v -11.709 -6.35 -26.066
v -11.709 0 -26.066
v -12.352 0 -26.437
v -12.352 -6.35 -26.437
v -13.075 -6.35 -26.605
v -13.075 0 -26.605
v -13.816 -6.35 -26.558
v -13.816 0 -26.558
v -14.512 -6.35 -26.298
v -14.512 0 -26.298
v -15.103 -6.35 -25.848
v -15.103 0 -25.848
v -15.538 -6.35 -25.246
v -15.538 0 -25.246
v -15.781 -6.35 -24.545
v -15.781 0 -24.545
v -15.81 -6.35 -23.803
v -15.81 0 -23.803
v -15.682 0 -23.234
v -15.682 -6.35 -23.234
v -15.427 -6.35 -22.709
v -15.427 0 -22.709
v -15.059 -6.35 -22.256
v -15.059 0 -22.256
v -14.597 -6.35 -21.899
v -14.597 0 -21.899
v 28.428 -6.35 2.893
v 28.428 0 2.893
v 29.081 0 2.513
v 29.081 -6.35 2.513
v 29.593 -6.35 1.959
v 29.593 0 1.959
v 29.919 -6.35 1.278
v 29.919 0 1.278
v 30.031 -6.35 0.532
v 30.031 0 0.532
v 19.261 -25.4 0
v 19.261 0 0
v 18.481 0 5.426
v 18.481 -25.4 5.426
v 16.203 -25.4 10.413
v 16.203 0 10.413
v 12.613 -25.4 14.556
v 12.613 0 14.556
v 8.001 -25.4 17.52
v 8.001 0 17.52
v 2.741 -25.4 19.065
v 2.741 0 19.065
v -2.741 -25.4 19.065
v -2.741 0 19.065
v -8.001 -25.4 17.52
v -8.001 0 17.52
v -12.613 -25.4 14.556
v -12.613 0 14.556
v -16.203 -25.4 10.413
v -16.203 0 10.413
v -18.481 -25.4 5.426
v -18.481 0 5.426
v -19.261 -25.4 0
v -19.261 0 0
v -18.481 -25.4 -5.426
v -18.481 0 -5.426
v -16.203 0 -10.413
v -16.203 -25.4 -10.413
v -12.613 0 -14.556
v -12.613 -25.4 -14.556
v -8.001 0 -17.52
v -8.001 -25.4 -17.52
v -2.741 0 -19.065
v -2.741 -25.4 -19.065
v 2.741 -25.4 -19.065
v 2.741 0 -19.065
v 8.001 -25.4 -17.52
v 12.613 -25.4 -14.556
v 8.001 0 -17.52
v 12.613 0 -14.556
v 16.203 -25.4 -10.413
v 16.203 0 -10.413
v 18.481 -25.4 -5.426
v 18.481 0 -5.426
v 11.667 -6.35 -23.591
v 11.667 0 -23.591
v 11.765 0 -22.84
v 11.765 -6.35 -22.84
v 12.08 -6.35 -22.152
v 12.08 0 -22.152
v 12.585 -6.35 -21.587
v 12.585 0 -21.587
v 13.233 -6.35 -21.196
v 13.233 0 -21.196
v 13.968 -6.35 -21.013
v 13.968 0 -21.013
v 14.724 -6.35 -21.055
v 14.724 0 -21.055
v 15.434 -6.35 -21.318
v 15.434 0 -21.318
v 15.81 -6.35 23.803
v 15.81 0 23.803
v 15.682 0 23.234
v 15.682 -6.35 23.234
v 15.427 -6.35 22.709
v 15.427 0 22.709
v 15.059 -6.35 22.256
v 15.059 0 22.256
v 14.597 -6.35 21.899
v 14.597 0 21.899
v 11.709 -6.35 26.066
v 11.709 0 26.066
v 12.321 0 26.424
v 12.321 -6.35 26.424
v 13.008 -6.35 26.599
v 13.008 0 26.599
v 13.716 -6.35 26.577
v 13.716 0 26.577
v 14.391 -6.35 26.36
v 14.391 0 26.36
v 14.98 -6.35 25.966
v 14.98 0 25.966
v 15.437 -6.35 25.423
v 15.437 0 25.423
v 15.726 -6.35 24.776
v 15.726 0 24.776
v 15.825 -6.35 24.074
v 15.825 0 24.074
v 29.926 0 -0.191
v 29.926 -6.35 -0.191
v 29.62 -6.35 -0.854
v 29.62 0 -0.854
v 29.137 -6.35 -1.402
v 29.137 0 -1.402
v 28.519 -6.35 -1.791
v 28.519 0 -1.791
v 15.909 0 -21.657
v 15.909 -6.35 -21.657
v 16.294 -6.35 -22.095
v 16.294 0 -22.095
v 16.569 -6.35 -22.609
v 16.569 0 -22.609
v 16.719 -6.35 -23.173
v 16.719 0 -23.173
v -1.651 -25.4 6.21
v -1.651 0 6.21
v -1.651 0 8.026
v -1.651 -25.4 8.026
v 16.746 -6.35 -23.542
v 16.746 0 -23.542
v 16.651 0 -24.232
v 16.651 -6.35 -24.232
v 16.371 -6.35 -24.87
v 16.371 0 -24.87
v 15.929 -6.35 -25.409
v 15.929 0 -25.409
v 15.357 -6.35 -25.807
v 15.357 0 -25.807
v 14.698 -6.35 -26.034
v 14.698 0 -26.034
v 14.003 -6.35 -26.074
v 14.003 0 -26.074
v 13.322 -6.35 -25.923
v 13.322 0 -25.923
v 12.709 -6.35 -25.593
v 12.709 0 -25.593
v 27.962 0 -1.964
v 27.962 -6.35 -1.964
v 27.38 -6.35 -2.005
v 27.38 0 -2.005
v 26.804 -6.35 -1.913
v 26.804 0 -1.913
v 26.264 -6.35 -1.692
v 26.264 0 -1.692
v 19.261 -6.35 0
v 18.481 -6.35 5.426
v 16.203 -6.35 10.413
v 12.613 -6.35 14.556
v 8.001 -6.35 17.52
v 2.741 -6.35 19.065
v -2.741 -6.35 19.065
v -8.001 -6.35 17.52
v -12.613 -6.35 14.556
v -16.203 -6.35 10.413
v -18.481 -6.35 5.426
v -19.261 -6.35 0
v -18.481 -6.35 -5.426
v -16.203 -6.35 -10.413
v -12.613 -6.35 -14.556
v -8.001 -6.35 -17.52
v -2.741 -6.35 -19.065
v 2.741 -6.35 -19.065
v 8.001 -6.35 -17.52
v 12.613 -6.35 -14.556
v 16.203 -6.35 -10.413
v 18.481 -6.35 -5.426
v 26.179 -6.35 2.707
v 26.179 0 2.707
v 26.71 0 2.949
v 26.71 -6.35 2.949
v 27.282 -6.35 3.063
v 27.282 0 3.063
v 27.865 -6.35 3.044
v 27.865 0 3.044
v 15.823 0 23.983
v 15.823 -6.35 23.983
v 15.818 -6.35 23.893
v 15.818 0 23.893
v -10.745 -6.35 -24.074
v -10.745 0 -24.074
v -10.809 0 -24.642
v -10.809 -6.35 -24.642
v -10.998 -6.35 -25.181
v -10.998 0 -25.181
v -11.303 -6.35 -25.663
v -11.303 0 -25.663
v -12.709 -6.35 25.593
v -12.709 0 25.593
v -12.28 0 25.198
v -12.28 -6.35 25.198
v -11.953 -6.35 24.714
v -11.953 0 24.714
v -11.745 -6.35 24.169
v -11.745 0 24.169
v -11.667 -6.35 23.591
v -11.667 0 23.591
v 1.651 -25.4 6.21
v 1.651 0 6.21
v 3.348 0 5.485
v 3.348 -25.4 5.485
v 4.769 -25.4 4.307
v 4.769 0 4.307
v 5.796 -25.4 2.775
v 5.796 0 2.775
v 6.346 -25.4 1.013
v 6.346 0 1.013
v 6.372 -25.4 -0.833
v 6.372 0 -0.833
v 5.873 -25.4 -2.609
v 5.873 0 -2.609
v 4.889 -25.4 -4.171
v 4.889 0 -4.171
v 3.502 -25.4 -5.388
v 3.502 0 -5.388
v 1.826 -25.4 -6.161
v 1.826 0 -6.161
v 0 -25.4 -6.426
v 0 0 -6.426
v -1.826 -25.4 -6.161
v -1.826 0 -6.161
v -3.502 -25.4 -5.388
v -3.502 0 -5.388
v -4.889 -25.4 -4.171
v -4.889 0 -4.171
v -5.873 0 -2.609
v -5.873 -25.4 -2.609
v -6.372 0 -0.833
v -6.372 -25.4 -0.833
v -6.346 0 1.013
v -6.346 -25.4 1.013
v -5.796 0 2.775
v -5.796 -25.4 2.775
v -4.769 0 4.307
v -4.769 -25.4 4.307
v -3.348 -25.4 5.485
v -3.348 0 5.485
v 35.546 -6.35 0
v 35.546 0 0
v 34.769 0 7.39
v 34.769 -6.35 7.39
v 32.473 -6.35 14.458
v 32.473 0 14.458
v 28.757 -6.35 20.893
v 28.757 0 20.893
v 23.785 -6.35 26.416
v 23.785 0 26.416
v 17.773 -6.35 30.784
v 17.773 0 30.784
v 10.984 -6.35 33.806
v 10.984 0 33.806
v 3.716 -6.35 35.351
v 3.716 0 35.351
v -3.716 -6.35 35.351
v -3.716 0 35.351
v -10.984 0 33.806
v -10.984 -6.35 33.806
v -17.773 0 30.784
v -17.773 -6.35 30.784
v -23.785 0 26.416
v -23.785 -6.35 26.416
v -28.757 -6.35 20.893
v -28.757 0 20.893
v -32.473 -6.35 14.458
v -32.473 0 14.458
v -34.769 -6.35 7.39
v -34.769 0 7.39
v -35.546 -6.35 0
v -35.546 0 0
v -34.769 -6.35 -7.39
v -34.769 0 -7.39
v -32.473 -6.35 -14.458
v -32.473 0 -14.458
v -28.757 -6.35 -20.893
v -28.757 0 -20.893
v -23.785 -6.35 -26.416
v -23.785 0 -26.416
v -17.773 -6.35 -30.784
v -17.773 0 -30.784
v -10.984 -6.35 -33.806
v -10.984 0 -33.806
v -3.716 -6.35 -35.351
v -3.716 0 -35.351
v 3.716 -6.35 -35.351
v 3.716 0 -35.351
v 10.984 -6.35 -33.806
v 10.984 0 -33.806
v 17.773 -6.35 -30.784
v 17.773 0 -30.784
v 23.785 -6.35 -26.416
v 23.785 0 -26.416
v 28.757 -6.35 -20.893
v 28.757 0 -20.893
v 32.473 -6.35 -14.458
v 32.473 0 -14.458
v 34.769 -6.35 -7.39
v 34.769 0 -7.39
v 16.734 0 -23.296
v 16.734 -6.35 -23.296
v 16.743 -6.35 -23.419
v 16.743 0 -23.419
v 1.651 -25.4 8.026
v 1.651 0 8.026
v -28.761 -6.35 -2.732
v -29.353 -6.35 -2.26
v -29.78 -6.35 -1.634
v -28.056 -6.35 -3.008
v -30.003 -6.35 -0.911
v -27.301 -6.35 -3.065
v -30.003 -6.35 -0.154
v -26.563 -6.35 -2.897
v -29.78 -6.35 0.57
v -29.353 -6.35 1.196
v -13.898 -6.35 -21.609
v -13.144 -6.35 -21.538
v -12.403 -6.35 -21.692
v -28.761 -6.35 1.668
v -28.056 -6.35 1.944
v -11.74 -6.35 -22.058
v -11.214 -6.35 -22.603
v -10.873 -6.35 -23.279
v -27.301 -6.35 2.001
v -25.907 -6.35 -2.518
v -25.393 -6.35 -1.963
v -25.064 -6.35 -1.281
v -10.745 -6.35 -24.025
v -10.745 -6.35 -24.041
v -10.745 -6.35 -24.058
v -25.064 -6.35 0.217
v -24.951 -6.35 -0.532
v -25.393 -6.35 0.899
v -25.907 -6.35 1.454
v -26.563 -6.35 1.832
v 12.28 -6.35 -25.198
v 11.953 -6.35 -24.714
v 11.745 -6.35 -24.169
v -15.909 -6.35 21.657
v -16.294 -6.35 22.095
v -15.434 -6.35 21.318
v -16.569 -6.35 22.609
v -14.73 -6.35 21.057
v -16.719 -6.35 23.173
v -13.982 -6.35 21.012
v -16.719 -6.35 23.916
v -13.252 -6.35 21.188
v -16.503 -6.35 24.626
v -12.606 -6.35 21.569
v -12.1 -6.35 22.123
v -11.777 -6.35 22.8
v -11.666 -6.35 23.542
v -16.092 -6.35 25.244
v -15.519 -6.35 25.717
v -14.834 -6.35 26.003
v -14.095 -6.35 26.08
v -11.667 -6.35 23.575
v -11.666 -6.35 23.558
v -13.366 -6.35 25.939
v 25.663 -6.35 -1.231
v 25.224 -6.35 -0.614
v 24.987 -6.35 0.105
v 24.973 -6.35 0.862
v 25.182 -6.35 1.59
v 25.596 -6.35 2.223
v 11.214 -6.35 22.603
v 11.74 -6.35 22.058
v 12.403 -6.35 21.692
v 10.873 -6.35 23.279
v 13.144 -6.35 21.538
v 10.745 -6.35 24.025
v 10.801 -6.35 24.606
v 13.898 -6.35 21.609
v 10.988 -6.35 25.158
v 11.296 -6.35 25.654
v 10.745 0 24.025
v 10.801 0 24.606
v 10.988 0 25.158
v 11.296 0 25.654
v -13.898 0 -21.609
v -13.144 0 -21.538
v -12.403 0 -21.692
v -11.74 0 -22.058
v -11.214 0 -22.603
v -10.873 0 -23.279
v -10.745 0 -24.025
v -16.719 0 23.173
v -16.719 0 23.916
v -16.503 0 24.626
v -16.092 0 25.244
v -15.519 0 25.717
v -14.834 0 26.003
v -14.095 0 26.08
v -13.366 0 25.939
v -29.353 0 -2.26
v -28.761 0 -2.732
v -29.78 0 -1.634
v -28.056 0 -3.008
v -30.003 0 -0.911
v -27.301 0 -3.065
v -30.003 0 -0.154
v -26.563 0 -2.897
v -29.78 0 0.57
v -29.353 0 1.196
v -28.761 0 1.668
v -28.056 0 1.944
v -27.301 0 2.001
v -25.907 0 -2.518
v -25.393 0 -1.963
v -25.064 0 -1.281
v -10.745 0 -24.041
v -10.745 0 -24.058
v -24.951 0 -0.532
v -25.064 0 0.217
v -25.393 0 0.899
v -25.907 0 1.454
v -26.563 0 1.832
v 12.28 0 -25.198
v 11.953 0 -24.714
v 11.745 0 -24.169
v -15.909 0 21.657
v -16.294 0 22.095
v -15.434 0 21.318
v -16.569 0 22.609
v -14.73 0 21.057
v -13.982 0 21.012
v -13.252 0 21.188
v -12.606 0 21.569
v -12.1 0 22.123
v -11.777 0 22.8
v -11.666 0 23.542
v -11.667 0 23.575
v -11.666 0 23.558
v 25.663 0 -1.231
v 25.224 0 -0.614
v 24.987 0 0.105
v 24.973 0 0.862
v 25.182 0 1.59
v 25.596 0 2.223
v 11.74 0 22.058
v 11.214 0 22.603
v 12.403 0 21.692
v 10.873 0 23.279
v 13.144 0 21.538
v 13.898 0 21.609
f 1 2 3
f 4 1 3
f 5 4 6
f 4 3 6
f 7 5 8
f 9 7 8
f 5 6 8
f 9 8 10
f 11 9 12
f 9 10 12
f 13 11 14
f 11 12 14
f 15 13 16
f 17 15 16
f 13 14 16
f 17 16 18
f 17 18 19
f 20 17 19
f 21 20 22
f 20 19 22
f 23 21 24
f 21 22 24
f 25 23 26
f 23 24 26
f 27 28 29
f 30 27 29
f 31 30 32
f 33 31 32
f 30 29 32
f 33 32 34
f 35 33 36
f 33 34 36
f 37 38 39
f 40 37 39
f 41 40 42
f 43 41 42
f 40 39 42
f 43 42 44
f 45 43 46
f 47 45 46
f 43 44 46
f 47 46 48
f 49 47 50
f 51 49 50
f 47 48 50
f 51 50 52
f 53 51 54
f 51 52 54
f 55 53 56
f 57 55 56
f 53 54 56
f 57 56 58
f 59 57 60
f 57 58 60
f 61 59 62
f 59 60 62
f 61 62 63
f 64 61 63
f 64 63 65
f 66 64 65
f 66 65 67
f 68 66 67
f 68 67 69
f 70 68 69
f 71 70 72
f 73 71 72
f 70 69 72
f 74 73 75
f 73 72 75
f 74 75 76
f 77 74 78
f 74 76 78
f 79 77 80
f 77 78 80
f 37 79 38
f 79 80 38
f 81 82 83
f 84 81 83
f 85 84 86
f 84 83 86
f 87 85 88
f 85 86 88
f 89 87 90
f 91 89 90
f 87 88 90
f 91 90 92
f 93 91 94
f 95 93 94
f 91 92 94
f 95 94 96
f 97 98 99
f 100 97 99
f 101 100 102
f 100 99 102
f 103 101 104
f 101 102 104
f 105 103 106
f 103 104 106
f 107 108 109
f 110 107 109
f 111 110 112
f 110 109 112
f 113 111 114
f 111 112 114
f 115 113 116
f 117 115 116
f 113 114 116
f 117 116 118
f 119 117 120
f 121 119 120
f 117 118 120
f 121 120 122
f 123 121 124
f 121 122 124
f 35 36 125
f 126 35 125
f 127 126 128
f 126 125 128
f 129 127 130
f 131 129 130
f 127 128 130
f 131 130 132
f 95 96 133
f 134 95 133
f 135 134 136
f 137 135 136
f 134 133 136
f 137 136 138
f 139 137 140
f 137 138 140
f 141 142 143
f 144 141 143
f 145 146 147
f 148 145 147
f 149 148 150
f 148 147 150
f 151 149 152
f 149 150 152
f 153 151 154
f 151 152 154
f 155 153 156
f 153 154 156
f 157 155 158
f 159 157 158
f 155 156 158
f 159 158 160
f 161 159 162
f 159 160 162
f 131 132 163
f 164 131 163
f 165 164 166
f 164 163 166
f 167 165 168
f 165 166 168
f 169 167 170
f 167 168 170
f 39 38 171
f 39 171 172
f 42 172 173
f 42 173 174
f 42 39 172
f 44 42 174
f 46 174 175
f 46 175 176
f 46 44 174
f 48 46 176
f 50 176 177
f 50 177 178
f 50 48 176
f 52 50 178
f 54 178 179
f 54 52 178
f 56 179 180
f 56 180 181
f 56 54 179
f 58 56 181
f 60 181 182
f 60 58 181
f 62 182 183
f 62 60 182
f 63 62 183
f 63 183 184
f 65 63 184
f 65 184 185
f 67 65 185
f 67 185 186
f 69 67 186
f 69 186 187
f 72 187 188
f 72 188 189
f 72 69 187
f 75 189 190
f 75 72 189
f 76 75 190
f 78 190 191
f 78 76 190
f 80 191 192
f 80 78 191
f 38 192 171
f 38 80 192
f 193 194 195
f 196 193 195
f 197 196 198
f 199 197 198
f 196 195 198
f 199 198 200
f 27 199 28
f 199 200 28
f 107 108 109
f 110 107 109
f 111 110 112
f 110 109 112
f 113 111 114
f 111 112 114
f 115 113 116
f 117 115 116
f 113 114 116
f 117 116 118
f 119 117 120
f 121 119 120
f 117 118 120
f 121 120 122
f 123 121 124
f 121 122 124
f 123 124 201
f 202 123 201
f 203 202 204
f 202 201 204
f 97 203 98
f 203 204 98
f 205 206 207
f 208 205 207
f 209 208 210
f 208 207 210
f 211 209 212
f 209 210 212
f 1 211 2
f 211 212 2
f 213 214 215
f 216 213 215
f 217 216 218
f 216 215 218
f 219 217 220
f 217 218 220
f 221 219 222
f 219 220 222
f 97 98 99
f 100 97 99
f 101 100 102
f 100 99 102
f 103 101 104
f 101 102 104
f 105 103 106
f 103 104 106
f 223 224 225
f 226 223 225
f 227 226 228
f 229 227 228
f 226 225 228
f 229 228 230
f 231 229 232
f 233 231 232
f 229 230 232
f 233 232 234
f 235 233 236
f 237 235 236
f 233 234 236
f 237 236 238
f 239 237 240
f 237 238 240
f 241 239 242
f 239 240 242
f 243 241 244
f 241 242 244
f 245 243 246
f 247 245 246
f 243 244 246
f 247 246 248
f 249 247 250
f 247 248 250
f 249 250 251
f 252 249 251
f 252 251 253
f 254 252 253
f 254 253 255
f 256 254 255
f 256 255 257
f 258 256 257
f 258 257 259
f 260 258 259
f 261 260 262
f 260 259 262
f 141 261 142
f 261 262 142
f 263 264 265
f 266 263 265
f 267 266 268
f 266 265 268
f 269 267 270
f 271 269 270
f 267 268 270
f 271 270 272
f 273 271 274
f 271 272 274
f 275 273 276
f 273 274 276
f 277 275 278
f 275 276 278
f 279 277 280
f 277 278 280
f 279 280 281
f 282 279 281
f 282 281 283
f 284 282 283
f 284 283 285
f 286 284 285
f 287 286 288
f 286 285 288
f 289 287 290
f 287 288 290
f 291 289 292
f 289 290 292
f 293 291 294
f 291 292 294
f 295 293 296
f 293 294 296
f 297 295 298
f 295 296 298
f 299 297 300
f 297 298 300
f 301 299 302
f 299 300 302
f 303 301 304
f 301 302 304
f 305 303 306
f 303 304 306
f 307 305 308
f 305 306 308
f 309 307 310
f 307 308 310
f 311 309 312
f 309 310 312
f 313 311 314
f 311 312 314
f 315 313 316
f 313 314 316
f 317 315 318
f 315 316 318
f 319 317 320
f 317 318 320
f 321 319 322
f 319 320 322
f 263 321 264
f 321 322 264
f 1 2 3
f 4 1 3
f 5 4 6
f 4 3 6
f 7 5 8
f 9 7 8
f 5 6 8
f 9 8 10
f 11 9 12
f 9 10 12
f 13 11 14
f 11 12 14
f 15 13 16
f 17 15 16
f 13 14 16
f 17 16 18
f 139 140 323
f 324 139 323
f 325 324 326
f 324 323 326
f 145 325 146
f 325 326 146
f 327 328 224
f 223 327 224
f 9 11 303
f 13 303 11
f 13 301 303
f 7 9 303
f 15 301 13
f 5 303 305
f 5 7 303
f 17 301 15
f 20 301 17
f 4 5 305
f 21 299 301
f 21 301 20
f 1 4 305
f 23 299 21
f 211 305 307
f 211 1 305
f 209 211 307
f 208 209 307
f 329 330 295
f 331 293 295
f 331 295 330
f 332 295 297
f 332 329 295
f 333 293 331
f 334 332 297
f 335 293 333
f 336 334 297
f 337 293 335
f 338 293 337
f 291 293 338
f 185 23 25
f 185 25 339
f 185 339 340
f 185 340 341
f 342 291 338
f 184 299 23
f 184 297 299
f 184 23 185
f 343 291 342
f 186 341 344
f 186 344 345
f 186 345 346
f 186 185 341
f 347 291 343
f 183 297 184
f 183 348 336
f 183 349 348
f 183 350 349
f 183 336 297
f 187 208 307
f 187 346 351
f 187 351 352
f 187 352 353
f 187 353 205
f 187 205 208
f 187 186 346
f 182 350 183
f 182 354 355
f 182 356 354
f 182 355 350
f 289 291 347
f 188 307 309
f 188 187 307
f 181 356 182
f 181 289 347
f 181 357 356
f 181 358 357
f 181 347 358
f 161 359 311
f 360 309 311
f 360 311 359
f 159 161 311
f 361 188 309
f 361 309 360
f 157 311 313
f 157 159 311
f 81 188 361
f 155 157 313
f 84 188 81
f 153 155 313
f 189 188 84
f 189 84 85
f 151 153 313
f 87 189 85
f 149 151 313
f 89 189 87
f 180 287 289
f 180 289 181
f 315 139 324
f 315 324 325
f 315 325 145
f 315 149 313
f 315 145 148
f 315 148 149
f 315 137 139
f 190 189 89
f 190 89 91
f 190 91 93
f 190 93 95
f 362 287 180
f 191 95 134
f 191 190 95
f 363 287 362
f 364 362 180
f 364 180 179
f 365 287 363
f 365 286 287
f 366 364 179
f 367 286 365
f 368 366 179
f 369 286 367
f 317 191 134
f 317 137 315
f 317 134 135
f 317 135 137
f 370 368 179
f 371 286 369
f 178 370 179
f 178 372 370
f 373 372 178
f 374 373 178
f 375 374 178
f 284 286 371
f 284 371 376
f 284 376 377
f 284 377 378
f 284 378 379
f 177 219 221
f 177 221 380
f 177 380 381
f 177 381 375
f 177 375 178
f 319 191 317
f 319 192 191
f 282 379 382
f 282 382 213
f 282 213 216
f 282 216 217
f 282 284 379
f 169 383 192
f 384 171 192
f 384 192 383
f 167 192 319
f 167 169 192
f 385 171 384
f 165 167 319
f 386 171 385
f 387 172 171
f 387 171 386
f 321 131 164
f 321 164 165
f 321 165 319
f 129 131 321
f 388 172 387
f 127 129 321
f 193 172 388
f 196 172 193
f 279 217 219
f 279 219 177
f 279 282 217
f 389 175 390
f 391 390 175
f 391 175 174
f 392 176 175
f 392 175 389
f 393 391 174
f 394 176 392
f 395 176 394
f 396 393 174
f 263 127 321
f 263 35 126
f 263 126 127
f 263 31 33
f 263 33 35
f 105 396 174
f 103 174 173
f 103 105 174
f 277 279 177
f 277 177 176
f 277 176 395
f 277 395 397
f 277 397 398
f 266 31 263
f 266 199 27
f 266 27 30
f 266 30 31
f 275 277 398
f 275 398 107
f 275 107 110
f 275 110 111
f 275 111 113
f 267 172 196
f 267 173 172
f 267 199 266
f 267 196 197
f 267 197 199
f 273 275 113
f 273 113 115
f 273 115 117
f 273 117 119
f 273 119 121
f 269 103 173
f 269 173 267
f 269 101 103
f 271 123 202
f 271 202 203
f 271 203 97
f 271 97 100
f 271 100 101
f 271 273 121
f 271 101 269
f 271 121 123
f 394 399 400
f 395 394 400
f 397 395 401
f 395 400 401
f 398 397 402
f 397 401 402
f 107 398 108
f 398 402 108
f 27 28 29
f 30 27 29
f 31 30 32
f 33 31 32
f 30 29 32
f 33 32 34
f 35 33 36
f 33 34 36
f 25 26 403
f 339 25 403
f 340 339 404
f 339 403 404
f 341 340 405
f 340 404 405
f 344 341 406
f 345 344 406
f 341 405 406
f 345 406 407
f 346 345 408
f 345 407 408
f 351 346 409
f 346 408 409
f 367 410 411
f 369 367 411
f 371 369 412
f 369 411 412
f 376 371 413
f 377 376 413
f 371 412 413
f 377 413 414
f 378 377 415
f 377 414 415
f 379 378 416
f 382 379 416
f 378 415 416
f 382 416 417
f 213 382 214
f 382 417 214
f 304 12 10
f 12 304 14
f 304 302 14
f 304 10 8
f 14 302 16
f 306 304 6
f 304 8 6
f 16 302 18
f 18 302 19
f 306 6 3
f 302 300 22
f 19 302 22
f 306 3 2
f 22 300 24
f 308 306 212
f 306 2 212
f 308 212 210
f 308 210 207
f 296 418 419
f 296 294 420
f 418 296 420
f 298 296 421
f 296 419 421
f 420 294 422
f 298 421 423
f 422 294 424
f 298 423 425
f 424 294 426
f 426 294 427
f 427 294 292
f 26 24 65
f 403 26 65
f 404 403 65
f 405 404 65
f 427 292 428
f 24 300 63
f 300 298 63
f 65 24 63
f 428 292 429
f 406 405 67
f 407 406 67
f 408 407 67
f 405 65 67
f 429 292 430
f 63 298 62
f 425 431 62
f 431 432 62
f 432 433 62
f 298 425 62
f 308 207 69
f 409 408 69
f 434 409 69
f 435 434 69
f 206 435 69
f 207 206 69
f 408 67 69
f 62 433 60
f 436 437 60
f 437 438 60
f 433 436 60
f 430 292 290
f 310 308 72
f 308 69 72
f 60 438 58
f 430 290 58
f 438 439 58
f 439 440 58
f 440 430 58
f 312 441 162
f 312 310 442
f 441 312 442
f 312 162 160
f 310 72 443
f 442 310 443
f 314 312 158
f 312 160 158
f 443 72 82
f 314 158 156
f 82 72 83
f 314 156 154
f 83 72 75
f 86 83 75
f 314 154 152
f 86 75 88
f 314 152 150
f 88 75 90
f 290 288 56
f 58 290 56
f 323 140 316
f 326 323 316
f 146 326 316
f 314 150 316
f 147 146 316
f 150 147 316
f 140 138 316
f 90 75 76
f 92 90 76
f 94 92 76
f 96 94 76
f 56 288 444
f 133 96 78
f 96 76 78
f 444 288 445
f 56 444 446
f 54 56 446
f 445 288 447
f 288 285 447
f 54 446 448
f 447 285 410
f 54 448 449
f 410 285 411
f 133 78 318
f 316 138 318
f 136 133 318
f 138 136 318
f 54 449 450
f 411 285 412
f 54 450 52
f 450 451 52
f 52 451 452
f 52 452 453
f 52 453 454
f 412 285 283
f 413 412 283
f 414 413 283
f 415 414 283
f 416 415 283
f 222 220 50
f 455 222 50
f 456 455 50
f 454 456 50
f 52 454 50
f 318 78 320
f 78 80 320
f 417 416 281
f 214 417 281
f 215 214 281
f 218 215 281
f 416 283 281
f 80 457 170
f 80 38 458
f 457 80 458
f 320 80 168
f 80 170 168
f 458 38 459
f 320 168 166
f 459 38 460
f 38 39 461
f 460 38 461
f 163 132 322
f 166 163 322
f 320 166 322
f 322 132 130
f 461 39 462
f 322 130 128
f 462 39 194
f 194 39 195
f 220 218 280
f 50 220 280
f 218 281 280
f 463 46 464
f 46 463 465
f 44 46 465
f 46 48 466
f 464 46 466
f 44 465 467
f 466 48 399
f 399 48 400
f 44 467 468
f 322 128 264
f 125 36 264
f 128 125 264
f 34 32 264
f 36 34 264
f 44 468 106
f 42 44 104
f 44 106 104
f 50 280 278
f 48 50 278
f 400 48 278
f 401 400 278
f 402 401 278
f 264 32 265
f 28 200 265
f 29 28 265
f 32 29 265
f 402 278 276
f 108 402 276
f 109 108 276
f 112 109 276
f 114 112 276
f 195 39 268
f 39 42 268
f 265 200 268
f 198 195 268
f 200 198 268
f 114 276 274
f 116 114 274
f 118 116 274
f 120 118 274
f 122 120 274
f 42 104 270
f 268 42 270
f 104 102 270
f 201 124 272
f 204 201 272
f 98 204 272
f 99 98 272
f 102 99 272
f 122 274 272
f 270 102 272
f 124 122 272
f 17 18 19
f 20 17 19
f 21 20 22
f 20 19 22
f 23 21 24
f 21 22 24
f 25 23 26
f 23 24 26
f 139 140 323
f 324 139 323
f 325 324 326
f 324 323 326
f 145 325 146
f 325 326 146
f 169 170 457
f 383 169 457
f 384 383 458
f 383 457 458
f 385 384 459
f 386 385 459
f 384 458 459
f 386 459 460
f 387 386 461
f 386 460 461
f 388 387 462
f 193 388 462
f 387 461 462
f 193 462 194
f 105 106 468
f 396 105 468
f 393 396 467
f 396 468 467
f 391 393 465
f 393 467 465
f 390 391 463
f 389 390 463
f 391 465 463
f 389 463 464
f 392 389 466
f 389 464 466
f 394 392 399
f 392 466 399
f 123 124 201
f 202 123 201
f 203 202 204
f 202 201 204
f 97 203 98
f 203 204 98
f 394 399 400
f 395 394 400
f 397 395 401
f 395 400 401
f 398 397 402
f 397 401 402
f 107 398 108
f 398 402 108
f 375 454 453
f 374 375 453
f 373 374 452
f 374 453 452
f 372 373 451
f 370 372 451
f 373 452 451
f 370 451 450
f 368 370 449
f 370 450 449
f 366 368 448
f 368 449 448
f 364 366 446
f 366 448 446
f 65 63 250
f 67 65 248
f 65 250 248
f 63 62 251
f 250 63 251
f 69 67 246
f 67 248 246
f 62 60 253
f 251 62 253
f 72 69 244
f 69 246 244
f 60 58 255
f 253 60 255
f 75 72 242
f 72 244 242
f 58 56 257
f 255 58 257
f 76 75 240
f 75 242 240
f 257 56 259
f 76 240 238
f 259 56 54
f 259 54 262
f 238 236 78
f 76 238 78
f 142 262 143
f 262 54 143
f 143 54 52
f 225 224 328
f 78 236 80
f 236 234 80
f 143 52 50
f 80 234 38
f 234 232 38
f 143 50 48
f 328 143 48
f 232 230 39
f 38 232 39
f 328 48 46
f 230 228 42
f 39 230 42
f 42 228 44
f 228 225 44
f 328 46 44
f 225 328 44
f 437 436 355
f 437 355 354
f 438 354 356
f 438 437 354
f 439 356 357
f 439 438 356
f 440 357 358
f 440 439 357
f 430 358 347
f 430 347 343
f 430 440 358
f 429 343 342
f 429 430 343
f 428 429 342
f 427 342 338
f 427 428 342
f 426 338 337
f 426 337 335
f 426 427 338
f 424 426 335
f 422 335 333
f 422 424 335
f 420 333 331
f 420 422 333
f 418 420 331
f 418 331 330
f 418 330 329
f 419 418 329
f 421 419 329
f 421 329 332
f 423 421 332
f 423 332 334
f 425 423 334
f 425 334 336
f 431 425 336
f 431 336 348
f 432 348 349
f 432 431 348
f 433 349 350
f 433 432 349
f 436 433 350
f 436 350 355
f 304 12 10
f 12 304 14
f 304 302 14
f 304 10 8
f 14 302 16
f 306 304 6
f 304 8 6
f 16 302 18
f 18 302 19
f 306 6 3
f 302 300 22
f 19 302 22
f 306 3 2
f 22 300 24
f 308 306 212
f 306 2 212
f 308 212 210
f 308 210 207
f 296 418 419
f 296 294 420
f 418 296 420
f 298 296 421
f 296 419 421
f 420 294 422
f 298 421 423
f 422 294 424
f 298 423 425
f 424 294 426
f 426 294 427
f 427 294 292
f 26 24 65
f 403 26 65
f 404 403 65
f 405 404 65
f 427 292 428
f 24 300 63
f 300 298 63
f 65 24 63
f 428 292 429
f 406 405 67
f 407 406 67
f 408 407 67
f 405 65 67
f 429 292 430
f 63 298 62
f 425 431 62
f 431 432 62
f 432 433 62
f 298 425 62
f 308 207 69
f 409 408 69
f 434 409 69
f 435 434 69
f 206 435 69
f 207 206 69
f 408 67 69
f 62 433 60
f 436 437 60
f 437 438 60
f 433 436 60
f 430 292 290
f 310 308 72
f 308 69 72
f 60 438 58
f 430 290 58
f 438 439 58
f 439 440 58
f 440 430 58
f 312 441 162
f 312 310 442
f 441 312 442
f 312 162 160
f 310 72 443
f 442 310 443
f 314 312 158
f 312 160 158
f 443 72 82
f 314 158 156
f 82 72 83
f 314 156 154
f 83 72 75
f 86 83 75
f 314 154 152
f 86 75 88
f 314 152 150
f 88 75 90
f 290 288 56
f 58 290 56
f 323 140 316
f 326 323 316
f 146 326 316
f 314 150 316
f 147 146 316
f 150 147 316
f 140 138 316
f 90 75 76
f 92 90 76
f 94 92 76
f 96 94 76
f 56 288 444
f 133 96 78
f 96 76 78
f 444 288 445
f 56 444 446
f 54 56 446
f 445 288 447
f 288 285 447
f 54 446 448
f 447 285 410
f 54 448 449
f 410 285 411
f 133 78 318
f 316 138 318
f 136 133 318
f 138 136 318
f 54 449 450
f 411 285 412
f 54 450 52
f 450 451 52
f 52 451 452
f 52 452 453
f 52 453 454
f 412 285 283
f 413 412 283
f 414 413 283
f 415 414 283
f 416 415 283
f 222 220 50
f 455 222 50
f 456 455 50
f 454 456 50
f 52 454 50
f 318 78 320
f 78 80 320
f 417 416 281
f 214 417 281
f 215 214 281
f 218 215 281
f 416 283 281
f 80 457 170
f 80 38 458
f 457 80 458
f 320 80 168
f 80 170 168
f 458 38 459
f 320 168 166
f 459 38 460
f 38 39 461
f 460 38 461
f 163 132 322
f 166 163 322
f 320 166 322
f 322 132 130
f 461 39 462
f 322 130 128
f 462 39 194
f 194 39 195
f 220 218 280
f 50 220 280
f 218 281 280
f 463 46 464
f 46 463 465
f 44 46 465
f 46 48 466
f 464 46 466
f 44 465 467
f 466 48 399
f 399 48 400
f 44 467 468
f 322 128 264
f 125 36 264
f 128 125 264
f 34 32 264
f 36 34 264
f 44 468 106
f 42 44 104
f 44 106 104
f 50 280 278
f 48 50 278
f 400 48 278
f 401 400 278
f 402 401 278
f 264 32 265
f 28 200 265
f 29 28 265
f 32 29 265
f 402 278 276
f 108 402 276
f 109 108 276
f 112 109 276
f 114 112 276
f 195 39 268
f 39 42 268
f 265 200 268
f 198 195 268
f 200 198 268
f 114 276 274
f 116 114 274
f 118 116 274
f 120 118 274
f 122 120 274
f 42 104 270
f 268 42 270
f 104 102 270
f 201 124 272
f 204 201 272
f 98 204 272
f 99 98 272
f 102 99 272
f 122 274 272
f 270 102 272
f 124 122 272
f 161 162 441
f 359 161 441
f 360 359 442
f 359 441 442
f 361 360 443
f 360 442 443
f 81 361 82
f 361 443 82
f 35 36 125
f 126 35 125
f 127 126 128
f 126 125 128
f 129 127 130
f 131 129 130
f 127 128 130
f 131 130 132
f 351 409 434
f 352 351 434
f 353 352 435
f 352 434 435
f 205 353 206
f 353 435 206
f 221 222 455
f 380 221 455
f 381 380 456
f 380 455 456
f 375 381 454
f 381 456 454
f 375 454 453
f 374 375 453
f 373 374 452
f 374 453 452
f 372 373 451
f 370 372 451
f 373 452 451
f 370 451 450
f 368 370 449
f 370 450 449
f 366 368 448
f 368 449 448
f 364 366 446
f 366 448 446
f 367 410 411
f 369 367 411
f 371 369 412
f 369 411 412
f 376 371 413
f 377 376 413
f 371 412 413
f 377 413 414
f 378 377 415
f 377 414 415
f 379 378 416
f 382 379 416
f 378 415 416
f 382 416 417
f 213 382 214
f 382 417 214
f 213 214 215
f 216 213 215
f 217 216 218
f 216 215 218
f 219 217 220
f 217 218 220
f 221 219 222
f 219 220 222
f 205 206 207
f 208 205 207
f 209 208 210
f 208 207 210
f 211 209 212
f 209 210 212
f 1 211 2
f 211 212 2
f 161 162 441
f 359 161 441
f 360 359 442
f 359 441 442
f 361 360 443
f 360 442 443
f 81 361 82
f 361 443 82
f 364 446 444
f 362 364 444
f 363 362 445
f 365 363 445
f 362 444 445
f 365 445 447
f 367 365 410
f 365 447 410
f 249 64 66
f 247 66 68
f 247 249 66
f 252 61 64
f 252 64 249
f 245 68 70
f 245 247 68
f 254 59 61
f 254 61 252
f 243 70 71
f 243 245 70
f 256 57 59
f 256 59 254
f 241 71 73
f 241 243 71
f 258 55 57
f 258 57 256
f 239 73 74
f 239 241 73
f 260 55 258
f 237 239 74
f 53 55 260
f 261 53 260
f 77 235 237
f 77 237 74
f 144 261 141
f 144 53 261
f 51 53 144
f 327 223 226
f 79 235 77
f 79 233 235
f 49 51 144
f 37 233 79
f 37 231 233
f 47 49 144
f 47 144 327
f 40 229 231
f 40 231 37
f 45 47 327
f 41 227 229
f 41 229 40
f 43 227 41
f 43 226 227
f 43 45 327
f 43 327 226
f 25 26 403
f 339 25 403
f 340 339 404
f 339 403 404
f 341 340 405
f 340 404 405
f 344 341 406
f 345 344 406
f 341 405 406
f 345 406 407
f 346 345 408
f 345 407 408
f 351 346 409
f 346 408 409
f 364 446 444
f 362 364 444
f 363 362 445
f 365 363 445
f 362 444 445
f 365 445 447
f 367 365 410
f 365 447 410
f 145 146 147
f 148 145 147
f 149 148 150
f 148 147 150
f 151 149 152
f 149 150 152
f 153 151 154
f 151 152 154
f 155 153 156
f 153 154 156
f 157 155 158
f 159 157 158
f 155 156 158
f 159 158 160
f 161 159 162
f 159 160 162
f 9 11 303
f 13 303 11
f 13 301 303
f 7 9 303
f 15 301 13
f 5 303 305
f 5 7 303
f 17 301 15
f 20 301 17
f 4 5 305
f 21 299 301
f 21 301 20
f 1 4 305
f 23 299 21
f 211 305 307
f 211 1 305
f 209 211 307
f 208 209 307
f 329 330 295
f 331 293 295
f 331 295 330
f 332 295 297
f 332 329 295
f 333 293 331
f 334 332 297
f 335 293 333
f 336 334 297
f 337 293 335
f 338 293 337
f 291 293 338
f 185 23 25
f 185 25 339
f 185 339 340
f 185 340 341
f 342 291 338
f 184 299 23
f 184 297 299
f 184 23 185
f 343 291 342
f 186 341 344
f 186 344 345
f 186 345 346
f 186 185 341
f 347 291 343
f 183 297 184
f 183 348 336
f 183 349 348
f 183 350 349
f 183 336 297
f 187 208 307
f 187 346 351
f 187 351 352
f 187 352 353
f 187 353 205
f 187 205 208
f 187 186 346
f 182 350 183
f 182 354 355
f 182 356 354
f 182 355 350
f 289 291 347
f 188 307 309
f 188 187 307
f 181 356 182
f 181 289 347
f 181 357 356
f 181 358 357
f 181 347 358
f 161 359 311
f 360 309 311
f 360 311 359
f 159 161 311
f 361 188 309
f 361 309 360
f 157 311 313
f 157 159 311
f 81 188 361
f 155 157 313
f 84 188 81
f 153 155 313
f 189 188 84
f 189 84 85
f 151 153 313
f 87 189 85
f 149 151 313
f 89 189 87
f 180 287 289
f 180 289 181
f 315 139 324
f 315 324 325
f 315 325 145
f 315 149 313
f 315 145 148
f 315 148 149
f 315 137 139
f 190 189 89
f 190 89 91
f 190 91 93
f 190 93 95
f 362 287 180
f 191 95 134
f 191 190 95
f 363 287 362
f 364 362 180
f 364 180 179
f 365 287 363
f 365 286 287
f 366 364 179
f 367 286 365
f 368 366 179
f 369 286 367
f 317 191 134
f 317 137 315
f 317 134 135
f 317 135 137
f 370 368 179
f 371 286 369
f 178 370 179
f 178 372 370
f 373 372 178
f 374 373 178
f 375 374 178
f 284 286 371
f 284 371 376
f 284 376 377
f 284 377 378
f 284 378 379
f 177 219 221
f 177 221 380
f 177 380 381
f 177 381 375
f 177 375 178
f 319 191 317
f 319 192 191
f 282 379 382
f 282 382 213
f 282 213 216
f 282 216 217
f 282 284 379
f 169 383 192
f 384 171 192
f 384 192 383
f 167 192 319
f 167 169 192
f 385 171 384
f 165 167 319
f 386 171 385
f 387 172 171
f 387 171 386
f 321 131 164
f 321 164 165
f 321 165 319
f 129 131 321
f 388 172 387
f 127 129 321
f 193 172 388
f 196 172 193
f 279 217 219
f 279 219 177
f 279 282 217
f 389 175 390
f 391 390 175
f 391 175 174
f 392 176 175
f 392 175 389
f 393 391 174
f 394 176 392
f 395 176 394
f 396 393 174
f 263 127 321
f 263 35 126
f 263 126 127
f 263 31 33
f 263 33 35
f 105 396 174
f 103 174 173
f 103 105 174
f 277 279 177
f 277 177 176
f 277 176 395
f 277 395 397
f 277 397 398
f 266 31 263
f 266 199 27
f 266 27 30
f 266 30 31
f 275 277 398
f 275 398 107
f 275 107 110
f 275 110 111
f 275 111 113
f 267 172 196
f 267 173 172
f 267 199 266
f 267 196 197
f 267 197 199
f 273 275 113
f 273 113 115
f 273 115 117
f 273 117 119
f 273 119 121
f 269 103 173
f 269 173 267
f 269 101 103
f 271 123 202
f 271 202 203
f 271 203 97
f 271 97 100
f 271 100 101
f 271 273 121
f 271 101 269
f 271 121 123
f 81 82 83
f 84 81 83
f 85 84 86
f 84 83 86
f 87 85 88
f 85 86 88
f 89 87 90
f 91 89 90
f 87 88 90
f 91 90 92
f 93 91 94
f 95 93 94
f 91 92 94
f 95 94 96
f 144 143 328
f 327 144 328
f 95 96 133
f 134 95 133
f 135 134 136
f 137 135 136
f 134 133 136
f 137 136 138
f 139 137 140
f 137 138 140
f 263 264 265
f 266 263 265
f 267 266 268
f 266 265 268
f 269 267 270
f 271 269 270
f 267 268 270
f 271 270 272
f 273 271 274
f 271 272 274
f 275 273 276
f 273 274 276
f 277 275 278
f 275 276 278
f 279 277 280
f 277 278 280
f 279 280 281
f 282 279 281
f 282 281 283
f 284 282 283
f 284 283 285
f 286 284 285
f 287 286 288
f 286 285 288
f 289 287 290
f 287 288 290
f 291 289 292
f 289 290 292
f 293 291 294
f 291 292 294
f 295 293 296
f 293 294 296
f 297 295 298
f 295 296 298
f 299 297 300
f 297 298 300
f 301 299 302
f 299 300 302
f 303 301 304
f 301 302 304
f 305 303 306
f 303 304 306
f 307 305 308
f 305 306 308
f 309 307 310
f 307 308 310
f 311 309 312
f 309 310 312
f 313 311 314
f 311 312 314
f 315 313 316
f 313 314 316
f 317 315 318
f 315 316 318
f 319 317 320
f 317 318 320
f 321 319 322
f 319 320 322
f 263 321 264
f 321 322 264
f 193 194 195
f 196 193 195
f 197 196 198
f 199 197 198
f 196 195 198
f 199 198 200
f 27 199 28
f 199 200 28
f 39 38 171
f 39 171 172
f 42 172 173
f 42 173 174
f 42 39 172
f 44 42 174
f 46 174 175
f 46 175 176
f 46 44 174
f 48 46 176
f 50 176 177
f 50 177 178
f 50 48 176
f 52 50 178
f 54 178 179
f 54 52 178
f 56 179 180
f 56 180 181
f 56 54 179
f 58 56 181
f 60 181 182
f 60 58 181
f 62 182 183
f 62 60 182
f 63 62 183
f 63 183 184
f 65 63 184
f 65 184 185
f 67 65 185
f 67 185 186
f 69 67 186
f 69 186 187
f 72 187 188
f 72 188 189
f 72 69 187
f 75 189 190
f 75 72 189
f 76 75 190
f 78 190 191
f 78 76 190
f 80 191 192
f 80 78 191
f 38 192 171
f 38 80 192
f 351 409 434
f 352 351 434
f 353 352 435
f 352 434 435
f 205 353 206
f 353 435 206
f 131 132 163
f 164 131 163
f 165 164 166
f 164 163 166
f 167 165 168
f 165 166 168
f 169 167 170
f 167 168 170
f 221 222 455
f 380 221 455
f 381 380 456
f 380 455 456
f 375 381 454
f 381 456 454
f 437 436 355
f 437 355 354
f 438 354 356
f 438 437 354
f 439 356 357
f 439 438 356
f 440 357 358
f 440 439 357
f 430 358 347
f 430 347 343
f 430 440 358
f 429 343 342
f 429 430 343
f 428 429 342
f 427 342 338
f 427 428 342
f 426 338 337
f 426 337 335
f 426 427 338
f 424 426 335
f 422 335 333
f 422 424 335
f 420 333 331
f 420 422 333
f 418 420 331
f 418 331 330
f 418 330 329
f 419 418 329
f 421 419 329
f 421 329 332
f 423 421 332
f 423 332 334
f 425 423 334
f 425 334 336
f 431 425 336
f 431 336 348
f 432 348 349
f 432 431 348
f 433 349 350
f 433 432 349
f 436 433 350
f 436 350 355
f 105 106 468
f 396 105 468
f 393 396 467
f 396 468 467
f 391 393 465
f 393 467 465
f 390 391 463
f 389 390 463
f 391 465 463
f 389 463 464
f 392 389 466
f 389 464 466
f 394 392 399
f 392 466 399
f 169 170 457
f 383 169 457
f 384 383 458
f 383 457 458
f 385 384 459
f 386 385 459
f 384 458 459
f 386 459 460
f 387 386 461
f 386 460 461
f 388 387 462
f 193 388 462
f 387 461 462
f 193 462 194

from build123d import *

# Parameters (mm, degrees)
F0_R     = 19.2609735147
F0_R_2   = 12.2005703348
F1_DEPTH = 25.4
F0_R_3   = 35.5458123626
F0_R_4   = 2.54
F2_DEPTH = 6.35
F3_DEPTH = 6.35


# Not quite as in the source:
# - a feature names something its author has since deleted; it is built from what else it names


with BuildPart() as f1:
    # F0 (on Front) → F1 (new body)
    with BuildSketch(Plane.XZ):
        Circle(F0_R)
        Circle(F0_R_2, mode=Mode.SUBTRACT)
        Circle(F0_R_2)
        with BuildLine():
            ThreePointArc((1.651, 6.2104947822), (0, -6.4262), (-1.651, 6.2104947822))
            Line((-1.651, 6.2104947822), (-1.651, 8.0264))
            Line((-1.651, 8.0264), (1.651, 8.0264))
            Line((1.651, 8.0264), (1.651, 6.2104947822))
        make_face(mode=Mode.SUBTRACT)
    extrude(amount=F1_DEPTH)


with BuildPart() as f2:
    # F0 (on Front) → F2 (new body)
    with BuildSketch(Plane.XZ):
        Circle(F0_R_3)
        with BuildLine():
            ThreePointArc((-15.8102357857, -23.8026693755), (-15.4266913627, -22.7088700736), (-14.5971077055, -21.899367638))
            ThreePointArc((-14.5971077055, -21.899367638), (-12.0575833253, -21.8502156048), (-10.7452542258, -24.024932215))
            ThreePointArc((-10.7452542258, -24.024932215), (-10.7448975137, -24.0495070811), (-10.744778606, -24.0740842482))
            ThreePointArc((-10.744778606, -24.0740842482), (-10.9984346498, -25.1805341179), (-11.7087402706, -26.0659936752))
            ThreePointArc((-11.7087402706, -26.0659936752), (-14.5119738867, -26.2979528916), (-15.8102357857, -23.8026693755))
        make_face(mode=Mode.SUBTRACT)
        with Locations((-27.4911578348, -0.5320863677)):
            Circle(F0_R_4, mode=Mode.SUBTRACT)
        with BuildLine():
            ThreePointArc((12.7085984642, -25.593400518), (11.9531126936, -24.7143416532), (11.6668548486, -23.5911499138))
            ThreePointArc((11.6668548486, -23.5911499138), (12.8940501293, -21.3672812704), (15.4335745095, -21.3181292371))
            ThreePointArc((15.4335745095, -21.3181292371), (16.2938606715, -22.0949245492), (16.7194425623, -23.1730633582))
            ThreePointArc((16.7194425623, -23.1730633582), (16.7396361115, -23.3570395976), (16.7463792288, -23.5419978805))
            ThreePointArc((16.7463792288, -23.5419978805), (15.3568653995, -25.8065025882), (12.7085984642, -25.593400518))
        make_face(mode=Mode.SUBTRACT)
        with BuildLine():
            ThreePointArc((-12.7085984642, 25.593400518), (-11.9531126936, 24.7143416532), (-11.6668548486, 23.5911499138))
            ThreePointArc((-11.6668548486, 23.5911499138), (-11.6664981365, 23.5665750477), (-11.6663792288, 23.5419978805))
            ThreePointArc((-11.6663792288, 23.5419978805), (-12.9151542316, 21.3546849156), (-15.4335745095, 21.3181292371))
            ThreePointArc((-15.4335745095, 21.3181292371), (-16.2938606715, 22.0949245492), (-16.7194425623, 23.1730633582))
            ThreePointArc((-16.7194425623, 23.1730633582), (-15.5187083283, 25.7167144907), (-12.7085984642, 25.593400518))
        make_face(mode=Mode.SUBTRACT)
        Circle(F0_R, mode=Mode.SUBTRACT)
        with BuildLine():
            ThreePointArc((28.5188342499, -1.7907311425), (27.3798040563, -2.0054715796), (26.2639625541, -1.6917822757))
            ThreePointArc((26.2639625541, -1.6917822757), (24.9516334546, 0.4829343345), (26.1788287353, 2.7068029779))
            ThreePointArc((26.1788287353, 2.7068029779), (27.2816962901, 3.0634349927), (28.4281828329, 2.892930317))
            ThreePointArc((28.4281828329, 2.892930317), (29.592543508, 1.9588933807), (30.0311578348, 0.5320863677))
            ThreePointArc((30.0311578348, 0.5320863677), (29.6197604391, -0.8537891508), (28.5188342499, -1.7907311425))
        make_face(mode=Mode.SUBTRACT)
        with BuildLine():
            ThreePointArc((15.8102357857, 23.8026693755), (15.4266913627, 22.7088700736), (14.5971077055, 21.899367638))
            ThreePointArc((14.5971077055, 21.899367638), (12.0575833253, 21.8502156048), (10.7452542258, 24.024932215))
            ThreePointArc((10.7452542258, 24.024932215), (10.9878356185, 25.1583595419), (11.7087402706, 26.0659936752))
            ThreePointArc((11.7087402706, 26.0659936752), (14.3912284756, 26.3604282044), (15.824778606, 24.0740842482))
            ThreePointArc((15.824778606, 24.0740842482), (15.8211402951, 23.9381821449), (15.8102357857, 23.8026693755))
        make_face(mode=Mode.SUBTRACT)
    extrude(amount=F2_DEPTH)


with BuildPart() as f3:
    # F0 (on Front) → F3 (new body)
    with BuildSketch(Plane.XZ):
        Circle(F0_R_3)
        with BuildLine():
            ThreePointArc((-15.8102357857, -23.8026693755), (-15.4266913627, -22.7088700736), (-14.5971077055, -21.899367638))
            ThreePointArc((-14.5971077055, -21.899367638), (-12.0575833253, -21.8502156048), (-10.7452542258, -24.024932215))
            ThreePointArc((-10.7452542258, -24.024932215), (-10.7448975137, -24.0495070811), (-10.744778606, -24.0740842482))
            ThreePointArc((-10.744778606, -24.0740842482), (-10.9984346498, -25.1805341179), (-11.7087402706, -26.0659936752))
            ThreePointArc((-11.7087402706, -26.0659936752), (-14.5119738867, -26.2979528916), (-15.8102357857, -23.8026693755))
        make_face(mode=Mode.SUBTRACT)
        with Locations((-27.4911578348, -0.5320863677)):
            Circle(F0_R_4, mode=Mode.SUBTRACT)
        with BuildLine():
            ThreePointArc((12.7085984642, -25.593400518), (11.9531126936, -24.7143416532), (11.6668548486, -23.5911499138))
            ThreePointArc((11.6668548486, -23.5911499138), (12.8940501293, -21.3672812704), (15.4335745095, -21.3181292371))
            ThreePointArc((15.4335745095, -21.3181292371), (16.2938606715, -22.0949245492), (16.7194425623, -23.1730633582))
            ThreePointArc((16.7194425623, -23.1730633582), (16.7396361115, -23.3570395976), (16.7463792288, -23.5419978805))
            ThreePointArc((16.7463792288, -23.5419978805), (15.3568653995, -25.8065025882), (12.7085984642, -25.593400518))
        make_face(mode=Mode.SUBTRACT)
        with BuildLine():
            ThreePointArc((-12.7085984642, 25.593400518), (-11.9531126936, 24.7143416532), (-11.6668548486, 23.5911499138))
            ThreePointArc((-11.6668548486, 23.5911499138), (-11.6664981365, 23.5665750477), (-11.6663792288, 23.5419978805))
            ThreePointArc((-11.6663792288, 23.5419978805), (-12.9151542316, 21.3546849156), (-15.4335745095, 21.3181292371))
            ThreePointArc((-15.4335745095, 21.3181292371), (-16.2938606715, 22.0949245492), (-16.7194425623, 23.1730633582))
            ThreePointArc((-16.7194425623, 23.1730633582), (-15.5187083283, 25.7167144907), (-12.7085984642, 25.593400518))
        make_face(mode=Mode.SUBTRACT)
        Circle(F0_R, mode=Mode.SUBTRACT)
        with BuildLine():
            ThreePointArc((28.5188342499, -1.7907311425), (27.3798040563, -2.0054715796), (26.2639625541, -1.6917822757))
            ThreePointArc((26.2639625541, -1.6917822757), (24.9516334546, 0.4829343345), (26.1788287353, 2.7068029779))
            ThreePointArc((26.1788287353, 2.7068029779), (27.2816962901, 3.0634349927), (28.4281828329, 2.892930317))
            ThreePointArc((28.4281828329, 2.892930317), (29.592543508, 1.9588933807), (30.0311578348, 0.5320863677))
            ThreePointArc((30.0311578348, 0.5320863677), (29.6197604391, -0.8537891508), (28.5188342499, -1.7907311425))
        make_face(mode=Mode.SUBTRACT)
        with BuildLine():
            ThreePointArc((15.8102357857, 23.8026693755), (15.4266913627, 22.7088700736), (14.5971077055, 21.899367638))
            ThreePointArc((14.5971077055, 21.899367638), (12.0575833253, 21.8502156048), (10.7452542258, 24.024932215))
            ThreePointArc((10.7452542258, 24.024932215), (10.9878356185, 25.1583595419), (11.7087402706, 26.0659936752))
            ThreePointArc((11.7087402706, 26.0659936752), (14.3912284756, 26.3604282044), (15.824778606, 24.0740842482))
            ThreePointArc((15.824778606, 24.0740842482), (15.8211402951, 23.9381821449), (15.8102357857, 23.8026693755))
        make_face(mode=Mode.SUBTRACT)
    extrude(amount=F3_DEPTH)


solid = Compound([f1.part, f2.part, f3.part])
